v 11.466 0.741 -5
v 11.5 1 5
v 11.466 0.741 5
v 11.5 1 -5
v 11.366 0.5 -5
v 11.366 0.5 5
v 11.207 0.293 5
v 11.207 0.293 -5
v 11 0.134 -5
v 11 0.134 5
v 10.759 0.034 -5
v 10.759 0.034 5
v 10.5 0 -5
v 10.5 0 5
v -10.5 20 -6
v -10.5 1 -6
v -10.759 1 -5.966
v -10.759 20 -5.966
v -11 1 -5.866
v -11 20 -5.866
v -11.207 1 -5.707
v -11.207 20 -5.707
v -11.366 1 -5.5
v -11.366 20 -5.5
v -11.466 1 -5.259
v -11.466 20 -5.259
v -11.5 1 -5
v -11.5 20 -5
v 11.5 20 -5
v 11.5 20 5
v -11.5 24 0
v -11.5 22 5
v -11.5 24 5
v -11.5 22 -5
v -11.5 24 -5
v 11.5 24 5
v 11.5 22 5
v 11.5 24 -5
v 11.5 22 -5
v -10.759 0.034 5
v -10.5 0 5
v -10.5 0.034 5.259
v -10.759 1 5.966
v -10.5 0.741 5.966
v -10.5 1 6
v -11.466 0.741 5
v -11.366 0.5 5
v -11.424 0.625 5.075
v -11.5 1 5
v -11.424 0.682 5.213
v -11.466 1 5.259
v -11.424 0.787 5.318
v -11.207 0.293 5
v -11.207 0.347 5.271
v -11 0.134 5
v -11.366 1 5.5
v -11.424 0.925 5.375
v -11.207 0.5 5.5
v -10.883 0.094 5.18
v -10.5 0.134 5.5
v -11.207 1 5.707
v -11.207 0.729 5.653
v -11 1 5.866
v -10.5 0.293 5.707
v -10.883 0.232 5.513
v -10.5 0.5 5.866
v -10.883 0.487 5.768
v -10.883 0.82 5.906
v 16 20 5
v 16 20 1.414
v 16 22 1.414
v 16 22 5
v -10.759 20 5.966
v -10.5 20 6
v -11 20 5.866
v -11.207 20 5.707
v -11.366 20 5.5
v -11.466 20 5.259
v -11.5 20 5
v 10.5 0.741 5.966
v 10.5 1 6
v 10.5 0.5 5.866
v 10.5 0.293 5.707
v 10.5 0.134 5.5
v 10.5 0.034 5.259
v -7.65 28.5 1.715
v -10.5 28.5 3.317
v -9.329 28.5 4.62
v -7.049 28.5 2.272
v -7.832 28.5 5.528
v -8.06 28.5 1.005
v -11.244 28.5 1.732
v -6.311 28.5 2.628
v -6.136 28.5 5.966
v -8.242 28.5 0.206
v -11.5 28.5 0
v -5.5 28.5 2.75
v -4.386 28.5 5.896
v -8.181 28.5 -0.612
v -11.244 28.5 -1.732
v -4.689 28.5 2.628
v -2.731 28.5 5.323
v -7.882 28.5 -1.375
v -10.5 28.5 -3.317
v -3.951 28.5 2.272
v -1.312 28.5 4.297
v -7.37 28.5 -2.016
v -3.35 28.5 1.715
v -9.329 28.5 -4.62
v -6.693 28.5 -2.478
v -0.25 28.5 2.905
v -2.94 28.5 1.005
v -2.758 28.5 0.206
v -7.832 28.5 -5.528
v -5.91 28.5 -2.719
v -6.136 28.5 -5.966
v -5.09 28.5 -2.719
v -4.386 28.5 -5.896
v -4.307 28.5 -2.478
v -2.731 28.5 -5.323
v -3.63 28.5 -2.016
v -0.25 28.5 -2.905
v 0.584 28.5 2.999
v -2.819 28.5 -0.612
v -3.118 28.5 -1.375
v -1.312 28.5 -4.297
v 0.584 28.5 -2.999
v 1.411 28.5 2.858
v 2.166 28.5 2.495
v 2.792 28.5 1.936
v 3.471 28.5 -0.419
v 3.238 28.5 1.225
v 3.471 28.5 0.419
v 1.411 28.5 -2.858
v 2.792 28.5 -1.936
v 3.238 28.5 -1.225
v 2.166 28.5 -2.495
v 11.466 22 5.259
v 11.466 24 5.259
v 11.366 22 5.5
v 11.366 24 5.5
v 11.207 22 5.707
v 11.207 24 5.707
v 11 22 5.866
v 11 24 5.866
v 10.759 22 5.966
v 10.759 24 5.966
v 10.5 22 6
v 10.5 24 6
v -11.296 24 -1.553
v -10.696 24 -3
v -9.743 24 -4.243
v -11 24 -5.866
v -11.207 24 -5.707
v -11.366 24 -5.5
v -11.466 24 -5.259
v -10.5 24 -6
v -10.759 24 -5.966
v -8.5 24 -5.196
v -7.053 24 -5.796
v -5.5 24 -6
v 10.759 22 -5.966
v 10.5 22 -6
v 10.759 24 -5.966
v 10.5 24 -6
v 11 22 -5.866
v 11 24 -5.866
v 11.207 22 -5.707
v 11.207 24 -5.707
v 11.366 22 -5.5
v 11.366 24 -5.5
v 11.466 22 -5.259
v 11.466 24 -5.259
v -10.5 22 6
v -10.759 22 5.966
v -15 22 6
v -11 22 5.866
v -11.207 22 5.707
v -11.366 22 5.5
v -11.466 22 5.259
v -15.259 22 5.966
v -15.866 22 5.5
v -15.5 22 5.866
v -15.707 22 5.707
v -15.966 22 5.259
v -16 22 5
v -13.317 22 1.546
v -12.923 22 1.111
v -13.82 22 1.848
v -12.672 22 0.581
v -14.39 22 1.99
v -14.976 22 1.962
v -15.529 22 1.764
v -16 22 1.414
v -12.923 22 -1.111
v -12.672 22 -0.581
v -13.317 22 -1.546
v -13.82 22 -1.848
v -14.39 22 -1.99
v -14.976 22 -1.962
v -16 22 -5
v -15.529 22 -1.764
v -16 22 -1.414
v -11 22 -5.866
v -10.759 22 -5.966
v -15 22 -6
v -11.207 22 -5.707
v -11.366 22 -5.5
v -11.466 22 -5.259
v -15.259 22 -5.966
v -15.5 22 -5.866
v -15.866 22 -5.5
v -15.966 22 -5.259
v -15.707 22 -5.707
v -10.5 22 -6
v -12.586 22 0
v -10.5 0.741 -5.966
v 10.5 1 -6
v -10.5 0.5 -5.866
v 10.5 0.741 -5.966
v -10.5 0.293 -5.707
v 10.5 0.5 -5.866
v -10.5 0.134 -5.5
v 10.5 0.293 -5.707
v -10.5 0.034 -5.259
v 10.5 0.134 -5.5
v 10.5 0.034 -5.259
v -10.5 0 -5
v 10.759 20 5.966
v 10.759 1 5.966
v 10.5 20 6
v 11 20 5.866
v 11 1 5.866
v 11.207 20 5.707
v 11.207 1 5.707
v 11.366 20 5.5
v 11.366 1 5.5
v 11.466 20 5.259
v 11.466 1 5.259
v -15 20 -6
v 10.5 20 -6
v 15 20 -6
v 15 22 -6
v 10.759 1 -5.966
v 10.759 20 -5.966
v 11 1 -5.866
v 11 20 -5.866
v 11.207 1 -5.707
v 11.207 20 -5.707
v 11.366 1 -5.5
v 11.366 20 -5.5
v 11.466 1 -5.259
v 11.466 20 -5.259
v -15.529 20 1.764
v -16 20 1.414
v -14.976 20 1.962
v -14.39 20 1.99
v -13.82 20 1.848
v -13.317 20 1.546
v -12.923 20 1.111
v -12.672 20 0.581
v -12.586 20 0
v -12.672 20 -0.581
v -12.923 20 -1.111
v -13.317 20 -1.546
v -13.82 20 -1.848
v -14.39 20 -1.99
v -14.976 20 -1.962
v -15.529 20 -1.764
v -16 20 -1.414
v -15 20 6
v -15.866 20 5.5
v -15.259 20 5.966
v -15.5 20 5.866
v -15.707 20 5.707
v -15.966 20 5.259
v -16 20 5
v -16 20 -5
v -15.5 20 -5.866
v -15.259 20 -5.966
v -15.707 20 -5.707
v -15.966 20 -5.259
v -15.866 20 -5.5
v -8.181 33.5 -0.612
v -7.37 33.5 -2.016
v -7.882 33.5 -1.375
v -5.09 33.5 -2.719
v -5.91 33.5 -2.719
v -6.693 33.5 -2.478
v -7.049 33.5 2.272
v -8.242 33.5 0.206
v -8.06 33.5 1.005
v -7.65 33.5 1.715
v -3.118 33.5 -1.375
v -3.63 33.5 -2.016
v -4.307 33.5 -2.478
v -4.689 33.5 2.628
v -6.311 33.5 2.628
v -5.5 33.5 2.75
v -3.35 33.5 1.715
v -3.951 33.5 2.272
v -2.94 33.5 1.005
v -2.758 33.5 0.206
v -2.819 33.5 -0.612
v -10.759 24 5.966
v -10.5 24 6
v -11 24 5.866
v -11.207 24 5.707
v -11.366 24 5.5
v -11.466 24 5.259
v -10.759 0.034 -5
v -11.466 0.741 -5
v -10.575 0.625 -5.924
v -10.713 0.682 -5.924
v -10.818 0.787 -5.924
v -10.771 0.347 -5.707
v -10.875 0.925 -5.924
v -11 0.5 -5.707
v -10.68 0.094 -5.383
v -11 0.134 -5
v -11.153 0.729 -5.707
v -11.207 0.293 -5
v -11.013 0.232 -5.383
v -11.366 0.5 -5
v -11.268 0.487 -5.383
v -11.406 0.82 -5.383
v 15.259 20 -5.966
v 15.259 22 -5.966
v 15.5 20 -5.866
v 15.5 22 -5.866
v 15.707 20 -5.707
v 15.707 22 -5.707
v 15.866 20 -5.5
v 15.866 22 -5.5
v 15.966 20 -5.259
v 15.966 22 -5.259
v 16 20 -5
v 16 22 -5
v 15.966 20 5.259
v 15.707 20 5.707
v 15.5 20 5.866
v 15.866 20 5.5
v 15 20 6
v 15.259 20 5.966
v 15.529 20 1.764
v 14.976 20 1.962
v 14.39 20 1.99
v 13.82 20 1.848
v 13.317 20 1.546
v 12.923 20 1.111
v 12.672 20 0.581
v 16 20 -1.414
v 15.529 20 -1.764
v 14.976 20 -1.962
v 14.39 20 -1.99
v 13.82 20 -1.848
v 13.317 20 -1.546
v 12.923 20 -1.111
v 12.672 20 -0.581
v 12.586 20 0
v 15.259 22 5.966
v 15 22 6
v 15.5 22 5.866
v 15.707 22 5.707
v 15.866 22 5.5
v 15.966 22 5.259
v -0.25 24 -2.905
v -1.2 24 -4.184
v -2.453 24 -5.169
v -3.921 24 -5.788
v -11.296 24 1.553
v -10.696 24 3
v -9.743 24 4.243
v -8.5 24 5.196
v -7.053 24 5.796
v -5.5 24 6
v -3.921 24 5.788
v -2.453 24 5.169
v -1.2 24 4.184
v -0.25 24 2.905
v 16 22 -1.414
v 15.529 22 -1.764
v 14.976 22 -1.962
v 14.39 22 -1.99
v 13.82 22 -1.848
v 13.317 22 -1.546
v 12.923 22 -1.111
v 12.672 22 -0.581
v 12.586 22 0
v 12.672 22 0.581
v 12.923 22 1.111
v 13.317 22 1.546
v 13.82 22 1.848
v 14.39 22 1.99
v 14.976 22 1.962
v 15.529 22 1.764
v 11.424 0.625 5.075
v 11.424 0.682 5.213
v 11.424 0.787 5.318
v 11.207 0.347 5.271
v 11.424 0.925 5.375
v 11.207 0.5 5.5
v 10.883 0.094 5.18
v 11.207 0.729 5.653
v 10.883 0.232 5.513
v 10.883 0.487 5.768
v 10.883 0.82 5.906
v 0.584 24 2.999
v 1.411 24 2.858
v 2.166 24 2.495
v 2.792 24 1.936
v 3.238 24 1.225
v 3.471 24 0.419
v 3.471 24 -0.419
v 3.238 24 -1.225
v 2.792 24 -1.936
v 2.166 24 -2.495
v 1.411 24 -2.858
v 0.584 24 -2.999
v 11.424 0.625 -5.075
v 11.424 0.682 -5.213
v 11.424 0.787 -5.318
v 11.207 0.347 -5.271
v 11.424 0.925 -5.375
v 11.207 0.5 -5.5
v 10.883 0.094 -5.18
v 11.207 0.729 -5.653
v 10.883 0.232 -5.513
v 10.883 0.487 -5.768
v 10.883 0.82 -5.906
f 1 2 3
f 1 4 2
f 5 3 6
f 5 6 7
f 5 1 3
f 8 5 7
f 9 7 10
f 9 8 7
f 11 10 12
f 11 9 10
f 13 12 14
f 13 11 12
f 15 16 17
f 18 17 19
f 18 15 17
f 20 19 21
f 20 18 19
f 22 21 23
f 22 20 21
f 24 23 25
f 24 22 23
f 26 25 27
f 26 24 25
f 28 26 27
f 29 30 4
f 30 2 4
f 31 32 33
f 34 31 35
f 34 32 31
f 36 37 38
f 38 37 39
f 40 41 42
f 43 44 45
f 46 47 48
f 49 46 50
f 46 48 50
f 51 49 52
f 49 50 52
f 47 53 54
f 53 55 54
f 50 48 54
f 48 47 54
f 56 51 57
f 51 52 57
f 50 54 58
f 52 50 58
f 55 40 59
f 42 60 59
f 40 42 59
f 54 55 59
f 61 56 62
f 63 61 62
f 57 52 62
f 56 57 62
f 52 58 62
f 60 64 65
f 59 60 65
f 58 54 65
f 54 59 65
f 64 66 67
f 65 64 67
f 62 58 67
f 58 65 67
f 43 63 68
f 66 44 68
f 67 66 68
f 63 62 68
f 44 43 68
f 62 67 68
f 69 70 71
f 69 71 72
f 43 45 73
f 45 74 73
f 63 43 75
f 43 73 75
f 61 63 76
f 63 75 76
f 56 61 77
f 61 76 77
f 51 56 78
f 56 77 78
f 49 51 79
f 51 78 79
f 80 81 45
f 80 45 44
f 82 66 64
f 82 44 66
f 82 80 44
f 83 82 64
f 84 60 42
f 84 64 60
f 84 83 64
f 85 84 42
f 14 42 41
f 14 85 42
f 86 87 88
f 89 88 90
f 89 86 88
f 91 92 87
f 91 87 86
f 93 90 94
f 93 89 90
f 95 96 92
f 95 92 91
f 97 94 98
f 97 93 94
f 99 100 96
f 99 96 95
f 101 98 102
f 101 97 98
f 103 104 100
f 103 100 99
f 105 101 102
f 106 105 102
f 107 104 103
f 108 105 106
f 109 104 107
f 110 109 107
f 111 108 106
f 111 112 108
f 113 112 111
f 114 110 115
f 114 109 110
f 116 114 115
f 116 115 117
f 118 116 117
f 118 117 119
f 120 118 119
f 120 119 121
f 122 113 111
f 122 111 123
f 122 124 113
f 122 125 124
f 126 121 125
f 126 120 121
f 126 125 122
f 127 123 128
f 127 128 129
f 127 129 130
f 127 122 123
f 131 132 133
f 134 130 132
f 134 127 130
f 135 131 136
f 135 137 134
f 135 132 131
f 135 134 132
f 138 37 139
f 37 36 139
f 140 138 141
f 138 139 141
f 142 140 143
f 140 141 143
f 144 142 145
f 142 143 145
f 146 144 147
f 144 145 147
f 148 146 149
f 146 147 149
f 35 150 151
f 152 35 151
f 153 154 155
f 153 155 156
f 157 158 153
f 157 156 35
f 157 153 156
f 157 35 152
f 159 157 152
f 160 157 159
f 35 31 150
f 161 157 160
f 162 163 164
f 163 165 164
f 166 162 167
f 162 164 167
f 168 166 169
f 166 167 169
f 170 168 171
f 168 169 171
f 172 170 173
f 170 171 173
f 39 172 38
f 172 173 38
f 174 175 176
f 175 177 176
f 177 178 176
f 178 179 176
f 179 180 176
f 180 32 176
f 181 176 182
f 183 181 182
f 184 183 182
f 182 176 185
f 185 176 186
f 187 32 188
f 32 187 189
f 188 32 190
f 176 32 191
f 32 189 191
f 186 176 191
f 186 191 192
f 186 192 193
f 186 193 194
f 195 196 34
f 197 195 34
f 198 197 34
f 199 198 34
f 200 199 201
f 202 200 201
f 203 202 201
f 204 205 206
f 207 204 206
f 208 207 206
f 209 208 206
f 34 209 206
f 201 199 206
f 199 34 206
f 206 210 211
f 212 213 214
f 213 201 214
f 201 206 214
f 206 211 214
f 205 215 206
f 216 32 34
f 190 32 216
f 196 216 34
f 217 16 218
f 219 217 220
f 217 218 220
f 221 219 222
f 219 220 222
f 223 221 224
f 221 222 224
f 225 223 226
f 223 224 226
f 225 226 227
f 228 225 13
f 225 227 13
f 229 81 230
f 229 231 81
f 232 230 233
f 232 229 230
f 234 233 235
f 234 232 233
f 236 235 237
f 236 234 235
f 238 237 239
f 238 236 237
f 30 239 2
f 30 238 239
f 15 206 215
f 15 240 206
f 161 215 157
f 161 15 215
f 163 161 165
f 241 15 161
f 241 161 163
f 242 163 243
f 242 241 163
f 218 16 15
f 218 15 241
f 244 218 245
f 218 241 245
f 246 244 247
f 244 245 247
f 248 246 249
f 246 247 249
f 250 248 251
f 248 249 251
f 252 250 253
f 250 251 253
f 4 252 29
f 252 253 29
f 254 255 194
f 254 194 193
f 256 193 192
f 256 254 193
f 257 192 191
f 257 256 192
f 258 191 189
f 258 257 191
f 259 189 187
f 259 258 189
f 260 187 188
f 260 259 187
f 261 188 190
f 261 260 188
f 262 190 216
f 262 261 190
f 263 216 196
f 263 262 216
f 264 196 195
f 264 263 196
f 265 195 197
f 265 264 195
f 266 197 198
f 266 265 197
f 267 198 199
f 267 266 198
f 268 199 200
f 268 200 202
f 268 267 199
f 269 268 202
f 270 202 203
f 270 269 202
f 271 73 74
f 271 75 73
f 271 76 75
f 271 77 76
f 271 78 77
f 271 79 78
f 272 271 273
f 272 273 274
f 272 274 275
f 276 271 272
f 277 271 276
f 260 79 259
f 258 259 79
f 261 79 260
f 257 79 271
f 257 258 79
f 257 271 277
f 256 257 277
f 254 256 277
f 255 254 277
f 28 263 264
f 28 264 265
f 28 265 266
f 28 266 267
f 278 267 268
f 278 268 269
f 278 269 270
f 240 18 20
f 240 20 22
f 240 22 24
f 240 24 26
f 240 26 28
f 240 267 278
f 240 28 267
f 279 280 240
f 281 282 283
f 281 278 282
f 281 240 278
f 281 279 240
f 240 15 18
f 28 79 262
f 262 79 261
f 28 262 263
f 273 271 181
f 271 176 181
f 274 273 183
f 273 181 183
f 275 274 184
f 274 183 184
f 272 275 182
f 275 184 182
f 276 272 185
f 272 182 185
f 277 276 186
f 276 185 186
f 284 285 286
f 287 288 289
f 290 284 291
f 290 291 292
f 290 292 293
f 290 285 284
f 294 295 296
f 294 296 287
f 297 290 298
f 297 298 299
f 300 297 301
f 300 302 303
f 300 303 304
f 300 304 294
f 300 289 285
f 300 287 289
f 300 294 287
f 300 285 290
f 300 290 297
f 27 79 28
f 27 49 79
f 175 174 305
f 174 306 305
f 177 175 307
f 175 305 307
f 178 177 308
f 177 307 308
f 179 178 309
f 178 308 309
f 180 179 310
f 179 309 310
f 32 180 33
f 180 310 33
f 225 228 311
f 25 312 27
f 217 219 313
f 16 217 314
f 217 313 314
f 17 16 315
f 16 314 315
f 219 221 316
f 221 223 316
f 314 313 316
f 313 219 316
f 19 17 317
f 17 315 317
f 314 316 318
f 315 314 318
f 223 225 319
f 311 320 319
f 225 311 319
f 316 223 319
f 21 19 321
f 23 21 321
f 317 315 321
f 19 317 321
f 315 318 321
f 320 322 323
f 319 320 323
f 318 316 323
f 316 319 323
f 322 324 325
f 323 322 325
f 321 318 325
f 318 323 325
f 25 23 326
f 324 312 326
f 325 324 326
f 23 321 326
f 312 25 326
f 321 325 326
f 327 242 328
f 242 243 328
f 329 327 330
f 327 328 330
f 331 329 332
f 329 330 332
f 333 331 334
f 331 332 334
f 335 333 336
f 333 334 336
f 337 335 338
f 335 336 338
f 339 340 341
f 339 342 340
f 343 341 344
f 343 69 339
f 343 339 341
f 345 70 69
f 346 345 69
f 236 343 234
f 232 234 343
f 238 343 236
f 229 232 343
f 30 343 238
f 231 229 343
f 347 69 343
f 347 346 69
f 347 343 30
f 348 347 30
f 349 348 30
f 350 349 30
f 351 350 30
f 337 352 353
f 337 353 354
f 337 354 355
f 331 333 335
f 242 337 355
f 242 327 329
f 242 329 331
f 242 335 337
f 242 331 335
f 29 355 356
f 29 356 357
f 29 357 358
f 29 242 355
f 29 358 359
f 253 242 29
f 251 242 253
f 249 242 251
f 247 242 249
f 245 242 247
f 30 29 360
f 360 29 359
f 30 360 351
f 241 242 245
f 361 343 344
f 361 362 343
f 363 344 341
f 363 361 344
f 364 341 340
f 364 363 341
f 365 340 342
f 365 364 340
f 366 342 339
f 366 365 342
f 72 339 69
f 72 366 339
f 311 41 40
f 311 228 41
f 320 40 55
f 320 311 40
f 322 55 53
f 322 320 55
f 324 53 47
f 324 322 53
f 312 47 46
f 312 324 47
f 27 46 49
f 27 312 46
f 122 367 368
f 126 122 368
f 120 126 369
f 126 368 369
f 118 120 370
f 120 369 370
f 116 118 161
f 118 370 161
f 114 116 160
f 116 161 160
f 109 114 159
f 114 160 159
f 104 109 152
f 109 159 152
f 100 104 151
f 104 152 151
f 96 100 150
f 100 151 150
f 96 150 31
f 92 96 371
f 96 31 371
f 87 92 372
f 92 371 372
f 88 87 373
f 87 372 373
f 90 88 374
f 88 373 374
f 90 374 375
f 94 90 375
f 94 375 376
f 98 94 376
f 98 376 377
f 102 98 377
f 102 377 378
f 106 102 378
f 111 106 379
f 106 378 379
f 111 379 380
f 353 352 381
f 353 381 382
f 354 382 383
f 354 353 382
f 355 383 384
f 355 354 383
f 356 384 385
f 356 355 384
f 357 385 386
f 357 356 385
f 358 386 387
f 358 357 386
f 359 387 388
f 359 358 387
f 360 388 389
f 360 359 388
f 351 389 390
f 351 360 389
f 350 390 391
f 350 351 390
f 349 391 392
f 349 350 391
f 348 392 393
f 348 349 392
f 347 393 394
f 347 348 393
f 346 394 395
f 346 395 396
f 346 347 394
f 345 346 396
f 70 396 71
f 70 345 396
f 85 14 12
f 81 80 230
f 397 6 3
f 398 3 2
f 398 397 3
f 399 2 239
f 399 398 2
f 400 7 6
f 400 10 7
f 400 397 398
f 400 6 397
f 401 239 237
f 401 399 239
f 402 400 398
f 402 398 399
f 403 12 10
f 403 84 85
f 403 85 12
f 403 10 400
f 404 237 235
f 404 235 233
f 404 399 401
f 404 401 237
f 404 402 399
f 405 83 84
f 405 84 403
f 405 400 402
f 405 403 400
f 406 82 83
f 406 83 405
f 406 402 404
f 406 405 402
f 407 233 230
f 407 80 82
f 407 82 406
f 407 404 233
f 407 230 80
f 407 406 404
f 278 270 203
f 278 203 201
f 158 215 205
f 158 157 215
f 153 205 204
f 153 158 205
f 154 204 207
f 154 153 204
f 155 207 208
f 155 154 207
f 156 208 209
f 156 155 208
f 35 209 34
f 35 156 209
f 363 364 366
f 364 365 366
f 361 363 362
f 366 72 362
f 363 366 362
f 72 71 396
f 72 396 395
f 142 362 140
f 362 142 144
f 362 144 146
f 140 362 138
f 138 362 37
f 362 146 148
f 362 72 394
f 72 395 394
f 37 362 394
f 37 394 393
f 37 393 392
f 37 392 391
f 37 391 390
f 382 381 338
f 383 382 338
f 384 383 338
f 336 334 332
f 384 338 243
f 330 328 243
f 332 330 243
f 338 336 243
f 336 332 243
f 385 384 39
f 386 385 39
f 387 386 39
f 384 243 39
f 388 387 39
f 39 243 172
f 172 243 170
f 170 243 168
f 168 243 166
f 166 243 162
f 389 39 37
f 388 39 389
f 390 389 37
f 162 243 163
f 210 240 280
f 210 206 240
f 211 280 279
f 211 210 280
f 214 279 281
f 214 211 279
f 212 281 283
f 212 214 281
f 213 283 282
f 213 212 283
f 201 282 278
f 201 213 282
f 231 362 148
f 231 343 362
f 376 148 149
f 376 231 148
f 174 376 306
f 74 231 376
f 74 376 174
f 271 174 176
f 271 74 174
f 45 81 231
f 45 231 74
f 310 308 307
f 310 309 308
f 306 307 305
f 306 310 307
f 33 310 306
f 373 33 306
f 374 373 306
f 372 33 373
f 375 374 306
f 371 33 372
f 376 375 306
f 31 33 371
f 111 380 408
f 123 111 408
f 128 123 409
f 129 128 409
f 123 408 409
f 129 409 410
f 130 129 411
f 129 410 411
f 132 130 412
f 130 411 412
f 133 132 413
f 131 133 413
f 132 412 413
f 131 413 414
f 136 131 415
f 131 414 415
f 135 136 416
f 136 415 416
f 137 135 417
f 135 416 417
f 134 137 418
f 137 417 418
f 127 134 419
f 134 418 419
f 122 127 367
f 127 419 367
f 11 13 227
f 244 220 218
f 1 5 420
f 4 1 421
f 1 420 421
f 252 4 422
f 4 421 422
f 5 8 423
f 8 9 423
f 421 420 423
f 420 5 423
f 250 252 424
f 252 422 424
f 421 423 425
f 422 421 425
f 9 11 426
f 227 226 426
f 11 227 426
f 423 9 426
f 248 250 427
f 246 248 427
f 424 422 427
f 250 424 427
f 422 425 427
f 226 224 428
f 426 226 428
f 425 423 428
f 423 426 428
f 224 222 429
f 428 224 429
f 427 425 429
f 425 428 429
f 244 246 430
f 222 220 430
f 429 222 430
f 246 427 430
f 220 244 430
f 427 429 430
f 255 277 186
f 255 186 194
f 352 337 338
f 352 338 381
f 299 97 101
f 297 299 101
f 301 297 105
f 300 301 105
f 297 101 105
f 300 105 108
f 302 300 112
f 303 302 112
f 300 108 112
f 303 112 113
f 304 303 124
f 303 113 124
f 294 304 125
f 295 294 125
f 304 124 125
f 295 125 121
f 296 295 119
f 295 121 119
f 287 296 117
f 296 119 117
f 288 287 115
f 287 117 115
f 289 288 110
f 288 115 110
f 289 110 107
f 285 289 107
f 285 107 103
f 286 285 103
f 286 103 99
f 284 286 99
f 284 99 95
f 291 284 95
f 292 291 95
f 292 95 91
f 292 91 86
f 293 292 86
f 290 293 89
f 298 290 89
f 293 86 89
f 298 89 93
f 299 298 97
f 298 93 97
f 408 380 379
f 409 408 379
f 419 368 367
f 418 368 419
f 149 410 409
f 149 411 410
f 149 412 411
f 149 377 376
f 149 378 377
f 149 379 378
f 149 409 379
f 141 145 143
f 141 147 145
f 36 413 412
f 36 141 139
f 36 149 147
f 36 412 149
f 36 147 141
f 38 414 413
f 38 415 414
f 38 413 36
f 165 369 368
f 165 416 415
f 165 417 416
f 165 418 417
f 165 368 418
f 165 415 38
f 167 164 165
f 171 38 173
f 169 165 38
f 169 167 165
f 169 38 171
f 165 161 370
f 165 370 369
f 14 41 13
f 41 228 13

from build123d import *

# Parameters (mm, degrees)
SKETCH1_W           = 23
SKETCH1_H           = 12
BOSS_EXTRUDE1_DEPTH = 20
BOSS_EXTRUDE2_DEPTH = 2
SKETCH3_W           = 23
SKETCH3_H           = 12
BOSS_EXTRUDE3_DEPTH = 2
BOSS_EXTRUDE4_DEPTH = 4.5
SKETCH5_R           = 2.75
BOSS_EXTRUDE5_DEPTH = 5
FILLET1_R           = 1


with BuildPart() as part:
    # Sketch1 → Boss-Extrude1 (new body)
    with BuildSketch(Plane(origin=(0, 0, 0), x_dir=(1, 0, 0), z_dir=(0, 1, 0))):
        Rectangle(SKETCH1_W, SKETCH1_H)
    extrude(amount=BOSS_EXTRUDE1_DEPTH)

    # Sketch2 → Boss-Extrude2 (add)
    with BuildSketch(Plane(origin=(0, 20, 0), x_dir=(1, 0, 0), z_dir=(0, 1, 0))):
        with BuildLine():
            Line((-16, 6), (16, 6))
            Line((16, 6), (16, 1.414213562))
            ThreePointArc((16, 1.414213562), (12.585786438, 0), (16, -1.414213562))
            Line((16, -1.414213562), (16, -6))
            Line((16, -6), (-16, -6))
            Line((-16, -6), (-16, -1.414213562))
            ThreePointArc((-16, -1.414213562), (-12.585786438, 0), (-16, 1.414213562))
            Line((-16, 1.414213562), (-16, 6))
        make_face()
    extrude(amount=BOSS_EXTRUDE2_DEPTH)

    # Sketch3 → Boss-Extrude3 (add)
    with BuildSketch(Plane(origin=(0, 22, 0), x_dir=(1, 0, 0), z_dir=(0, 1, 0))):
        Rectangle(SKETCH3_W, SKETCH3_H)
    extrude(amount=BOSS_EXTRUDE3_DEPTH)

    # Sketch4 → Boss-Extrude4 (add)
    with BuildSketch(Plane(origin=(0, 24, 0), x_dir=(1, 0, 0), z_dir=(0, 1, 0))):
        with BuildLine():
            ThreePointArc((-0.25, 2.90473751), (-11.5, 0), (-0.25, -2.90473751))
            ThreePointArc((-0.25, -2.90473751), (3.5, 0), (-0.25, 2.90473751))
        make_face()
    extrude(amount=BOSS_EXTRUDE4_DEPTH)

    # Sketch5 → Boss-Extrude5 (add)
    with BuildSketch(Plane(origin=(0, 28.5, 0), x_dir=(1, 0, 0), z_dir=(0, 1, 0))):
        with Locations(Location((-5.5, 0, 0), (0, 0, 270))):
            Circle(SKETCH5_R)
    extrude(amount=BOSS_EXTRUDE5_DEPTH)

    # Fillet1
    fillet1_edges = [part.edges().sort_by_distance(p)[0] for p in [
        (16, 21, 6),
        (16, 21, -6),
        (-16, 21, -6),
        (-16, 21, 6),
        (11.5, 23, 6),
        (11.5, 23, -6),
        (-11.5, 23, -6),
        (-11.5, 23, 6),
        (0, 0, 6),
        (-11.5, 0, 0),
        (0, 0, -6),
        (11.5, 0, 0),
        (11.5, 10, 6),
        (-11.5, 10, 6),
        (-11.5, 10, -6),
        (11.5, 10, -6),
    ]]
    fillet(fillet1_edges, radius=FILLET1_R)


solid = part.part
